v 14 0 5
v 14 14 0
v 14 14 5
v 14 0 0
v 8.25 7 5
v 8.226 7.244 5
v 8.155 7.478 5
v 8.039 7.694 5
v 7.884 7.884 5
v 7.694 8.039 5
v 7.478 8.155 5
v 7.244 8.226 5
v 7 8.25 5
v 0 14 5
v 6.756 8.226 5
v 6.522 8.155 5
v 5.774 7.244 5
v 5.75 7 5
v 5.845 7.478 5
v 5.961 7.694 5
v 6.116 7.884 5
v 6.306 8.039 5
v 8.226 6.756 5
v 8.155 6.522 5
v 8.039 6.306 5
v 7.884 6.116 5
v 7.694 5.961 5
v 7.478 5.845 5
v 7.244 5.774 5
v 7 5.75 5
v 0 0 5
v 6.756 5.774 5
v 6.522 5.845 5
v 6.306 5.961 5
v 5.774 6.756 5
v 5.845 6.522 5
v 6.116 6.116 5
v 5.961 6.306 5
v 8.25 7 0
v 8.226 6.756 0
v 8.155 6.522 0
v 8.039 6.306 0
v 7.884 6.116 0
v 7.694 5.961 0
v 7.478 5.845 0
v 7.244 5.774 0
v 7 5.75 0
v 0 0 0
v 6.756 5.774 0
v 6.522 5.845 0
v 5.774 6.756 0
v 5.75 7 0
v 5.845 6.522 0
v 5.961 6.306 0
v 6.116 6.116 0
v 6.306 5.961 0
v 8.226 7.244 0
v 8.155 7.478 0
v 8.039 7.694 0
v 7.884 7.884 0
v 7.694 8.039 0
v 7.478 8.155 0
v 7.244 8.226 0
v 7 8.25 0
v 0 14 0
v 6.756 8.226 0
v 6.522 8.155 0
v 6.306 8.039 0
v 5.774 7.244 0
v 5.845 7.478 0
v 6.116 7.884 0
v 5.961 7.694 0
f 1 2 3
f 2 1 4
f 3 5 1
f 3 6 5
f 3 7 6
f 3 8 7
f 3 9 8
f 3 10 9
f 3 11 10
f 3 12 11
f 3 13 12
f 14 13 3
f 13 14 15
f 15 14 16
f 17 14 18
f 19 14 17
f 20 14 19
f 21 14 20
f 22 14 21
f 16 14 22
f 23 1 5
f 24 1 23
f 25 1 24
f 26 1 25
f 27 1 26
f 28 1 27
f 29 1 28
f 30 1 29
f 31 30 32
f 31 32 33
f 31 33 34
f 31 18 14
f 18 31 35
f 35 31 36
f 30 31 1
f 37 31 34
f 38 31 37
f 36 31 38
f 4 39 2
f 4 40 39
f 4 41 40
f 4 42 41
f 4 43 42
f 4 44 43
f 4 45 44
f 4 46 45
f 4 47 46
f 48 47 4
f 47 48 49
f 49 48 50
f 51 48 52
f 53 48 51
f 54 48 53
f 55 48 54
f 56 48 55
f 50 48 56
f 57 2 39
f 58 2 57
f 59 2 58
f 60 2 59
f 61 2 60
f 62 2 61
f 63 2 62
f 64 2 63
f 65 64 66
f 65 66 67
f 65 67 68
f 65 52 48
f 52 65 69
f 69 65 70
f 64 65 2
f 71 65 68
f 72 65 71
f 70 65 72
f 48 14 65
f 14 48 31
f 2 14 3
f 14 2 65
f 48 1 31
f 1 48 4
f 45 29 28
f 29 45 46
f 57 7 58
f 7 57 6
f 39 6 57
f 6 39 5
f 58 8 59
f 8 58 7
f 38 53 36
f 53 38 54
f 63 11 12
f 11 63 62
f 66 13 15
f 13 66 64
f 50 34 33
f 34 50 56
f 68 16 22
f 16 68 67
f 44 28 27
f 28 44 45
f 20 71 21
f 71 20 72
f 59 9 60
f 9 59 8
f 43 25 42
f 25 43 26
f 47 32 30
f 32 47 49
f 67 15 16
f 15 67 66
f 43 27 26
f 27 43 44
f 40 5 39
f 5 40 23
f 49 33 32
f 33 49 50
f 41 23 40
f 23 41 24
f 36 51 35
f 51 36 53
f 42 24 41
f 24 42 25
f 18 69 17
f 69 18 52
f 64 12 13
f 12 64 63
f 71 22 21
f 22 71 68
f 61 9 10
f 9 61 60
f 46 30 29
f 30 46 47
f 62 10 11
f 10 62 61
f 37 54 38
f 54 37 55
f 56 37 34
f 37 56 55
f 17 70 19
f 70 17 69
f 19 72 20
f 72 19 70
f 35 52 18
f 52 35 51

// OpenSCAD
$fn = 32;

// ----------------------------------------------------------------------
// Micro pad: drilled pad, 5-20 mm class
// ----------------------------------------------------------------------

// --- parameters (mm) ---
pad_l = 14;               // pad length, X
pad_w = 14;               // pad width, Y
pad_t = 5;                // pad thickness, Z
hole_d = 2.5;             // through hole diameter

difference() {
  cube([pad_l, pad_w, pad_t]);
  translate([pad_l / 2, pad_w / 2, -1])
    cylinder(h = pad_t + 2, d = hole_d);
}
